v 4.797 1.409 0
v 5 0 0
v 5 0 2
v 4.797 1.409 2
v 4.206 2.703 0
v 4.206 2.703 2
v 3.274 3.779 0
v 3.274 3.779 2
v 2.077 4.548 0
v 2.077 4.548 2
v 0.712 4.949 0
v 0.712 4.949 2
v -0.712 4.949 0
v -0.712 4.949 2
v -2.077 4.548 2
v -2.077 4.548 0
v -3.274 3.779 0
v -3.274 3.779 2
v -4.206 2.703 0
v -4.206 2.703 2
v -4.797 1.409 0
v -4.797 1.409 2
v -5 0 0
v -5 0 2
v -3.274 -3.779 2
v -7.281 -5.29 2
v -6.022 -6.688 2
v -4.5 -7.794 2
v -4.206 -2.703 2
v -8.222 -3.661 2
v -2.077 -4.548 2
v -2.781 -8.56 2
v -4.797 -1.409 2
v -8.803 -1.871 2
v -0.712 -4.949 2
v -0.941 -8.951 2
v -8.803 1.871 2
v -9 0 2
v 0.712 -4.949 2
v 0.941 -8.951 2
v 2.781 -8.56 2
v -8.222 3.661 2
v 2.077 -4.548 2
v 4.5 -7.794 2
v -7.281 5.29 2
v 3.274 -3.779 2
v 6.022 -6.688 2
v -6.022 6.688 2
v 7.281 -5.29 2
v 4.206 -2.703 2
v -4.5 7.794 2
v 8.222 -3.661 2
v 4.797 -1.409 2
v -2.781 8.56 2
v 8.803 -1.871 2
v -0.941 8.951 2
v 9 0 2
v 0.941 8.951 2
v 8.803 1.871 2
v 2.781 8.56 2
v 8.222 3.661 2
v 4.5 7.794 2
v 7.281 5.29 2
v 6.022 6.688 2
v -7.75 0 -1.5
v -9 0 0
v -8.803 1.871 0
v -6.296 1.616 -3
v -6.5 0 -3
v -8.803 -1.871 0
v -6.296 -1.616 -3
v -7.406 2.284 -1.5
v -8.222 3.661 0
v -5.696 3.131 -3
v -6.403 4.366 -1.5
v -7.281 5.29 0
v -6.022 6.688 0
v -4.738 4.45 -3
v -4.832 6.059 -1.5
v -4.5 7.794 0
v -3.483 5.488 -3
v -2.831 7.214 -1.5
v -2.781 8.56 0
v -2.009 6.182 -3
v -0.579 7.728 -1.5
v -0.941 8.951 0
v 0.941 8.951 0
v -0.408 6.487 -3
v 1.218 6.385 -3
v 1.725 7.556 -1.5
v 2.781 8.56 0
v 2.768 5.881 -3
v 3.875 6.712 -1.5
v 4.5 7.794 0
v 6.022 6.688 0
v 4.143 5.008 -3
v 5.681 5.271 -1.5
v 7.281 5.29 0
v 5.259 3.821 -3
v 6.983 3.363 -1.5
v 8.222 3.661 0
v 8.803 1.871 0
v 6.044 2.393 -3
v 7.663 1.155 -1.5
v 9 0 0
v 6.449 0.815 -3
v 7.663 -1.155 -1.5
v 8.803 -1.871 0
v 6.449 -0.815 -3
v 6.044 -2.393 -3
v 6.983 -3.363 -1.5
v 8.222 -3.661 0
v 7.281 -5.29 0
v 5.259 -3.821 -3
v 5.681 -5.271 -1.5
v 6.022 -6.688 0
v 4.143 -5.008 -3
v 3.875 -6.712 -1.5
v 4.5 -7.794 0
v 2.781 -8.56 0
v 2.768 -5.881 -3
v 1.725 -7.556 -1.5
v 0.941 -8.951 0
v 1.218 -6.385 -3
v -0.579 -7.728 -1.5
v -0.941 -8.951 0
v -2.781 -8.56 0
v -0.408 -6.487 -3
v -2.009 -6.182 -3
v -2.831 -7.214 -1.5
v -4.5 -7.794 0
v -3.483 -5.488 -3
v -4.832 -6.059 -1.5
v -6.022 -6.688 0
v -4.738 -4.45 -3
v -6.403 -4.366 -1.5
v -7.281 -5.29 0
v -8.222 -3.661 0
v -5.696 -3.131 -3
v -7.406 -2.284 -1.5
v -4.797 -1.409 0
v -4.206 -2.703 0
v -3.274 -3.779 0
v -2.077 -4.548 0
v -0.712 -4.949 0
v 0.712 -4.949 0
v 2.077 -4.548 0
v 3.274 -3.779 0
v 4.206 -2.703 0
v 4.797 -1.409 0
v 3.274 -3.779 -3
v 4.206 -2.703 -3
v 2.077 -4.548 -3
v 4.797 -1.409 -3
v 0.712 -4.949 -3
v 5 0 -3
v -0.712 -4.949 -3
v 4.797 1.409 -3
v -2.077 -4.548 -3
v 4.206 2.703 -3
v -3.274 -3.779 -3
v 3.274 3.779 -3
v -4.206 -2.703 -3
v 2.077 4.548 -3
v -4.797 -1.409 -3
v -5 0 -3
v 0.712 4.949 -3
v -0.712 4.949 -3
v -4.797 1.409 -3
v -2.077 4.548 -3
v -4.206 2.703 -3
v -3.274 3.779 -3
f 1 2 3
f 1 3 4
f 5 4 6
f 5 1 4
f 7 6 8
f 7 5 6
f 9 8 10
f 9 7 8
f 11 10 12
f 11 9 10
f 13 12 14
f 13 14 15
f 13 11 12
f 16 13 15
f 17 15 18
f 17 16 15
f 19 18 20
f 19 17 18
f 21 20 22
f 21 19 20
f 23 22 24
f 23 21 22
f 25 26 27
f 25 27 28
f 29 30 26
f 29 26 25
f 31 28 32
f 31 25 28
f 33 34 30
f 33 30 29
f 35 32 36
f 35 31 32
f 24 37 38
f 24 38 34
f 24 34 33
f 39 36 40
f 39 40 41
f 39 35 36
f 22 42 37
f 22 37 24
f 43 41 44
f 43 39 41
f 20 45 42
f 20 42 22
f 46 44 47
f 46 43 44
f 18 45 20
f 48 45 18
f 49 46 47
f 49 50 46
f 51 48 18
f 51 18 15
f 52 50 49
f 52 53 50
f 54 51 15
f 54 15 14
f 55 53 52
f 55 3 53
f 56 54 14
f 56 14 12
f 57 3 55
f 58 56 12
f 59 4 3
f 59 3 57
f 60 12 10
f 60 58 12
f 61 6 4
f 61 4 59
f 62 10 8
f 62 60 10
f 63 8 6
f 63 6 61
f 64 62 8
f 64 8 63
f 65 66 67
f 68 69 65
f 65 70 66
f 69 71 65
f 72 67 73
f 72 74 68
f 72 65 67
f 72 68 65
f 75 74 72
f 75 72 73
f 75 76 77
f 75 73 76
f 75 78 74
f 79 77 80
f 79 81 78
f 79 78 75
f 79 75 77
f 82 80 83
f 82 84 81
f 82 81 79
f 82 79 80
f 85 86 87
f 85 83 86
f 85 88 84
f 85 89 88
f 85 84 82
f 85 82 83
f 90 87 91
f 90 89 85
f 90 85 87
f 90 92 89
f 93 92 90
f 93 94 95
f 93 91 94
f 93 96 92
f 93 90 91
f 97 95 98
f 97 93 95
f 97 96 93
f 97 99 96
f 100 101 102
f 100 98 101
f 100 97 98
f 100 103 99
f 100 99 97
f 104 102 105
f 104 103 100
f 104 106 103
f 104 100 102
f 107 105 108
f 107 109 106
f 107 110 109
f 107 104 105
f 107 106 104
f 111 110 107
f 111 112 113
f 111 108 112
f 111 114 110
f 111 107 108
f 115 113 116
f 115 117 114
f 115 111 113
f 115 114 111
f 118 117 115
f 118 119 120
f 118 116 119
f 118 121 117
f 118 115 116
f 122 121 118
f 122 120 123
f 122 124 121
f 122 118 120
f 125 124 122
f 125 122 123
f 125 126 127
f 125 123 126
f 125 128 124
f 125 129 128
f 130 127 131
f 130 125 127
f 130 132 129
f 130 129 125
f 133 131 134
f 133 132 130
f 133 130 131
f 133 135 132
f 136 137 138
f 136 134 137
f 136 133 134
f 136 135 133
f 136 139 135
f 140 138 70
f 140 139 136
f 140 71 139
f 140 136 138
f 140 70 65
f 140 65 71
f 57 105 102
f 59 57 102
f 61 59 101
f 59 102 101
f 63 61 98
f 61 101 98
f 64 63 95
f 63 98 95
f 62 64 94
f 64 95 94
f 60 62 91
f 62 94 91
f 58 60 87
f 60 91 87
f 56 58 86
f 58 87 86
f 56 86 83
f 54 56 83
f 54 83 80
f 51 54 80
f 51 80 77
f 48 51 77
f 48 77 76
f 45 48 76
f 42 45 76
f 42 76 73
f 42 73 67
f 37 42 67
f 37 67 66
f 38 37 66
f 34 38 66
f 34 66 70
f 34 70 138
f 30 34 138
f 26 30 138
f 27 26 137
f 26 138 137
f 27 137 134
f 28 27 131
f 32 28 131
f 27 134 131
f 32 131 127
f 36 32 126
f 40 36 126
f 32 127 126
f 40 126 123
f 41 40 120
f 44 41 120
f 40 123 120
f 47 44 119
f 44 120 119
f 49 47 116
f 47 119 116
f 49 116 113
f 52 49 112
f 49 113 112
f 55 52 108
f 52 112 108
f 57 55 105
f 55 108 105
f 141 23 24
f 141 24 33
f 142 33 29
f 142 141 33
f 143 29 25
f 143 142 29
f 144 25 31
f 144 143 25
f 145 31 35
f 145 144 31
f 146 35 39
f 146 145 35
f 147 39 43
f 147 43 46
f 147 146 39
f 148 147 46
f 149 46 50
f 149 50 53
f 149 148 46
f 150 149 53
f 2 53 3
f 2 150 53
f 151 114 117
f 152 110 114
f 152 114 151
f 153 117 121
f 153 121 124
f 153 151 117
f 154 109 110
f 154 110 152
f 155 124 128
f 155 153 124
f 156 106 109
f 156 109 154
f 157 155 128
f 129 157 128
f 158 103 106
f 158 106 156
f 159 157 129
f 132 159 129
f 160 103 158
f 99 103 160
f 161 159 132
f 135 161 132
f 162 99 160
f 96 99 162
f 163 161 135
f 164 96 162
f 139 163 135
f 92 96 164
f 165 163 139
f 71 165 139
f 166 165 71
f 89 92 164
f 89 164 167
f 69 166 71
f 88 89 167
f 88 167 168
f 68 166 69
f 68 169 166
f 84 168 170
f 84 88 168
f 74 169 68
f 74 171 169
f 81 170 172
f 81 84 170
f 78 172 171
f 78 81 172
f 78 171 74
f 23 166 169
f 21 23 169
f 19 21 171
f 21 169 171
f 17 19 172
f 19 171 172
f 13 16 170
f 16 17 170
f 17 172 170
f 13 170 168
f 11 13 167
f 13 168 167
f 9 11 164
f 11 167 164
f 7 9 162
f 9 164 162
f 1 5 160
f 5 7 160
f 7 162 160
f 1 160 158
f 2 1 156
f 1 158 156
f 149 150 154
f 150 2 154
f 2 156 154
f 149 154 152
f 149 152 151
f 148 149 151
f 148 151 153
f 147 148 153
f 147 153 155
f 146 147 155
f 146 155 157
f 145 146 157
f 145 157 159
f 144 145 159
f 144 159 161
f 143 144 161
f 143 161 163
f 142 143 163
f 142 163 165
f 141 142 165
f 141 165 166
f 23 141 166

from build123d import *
from build123d.topology import SkipClean

# Parameters (mm, degrees)
SKETCH1_R           = 9
SKETCH1_R_2         = 5
BOSS_EXTRUDE1_DEPTH = 2
SKETCH3_R           = 9
SKETCH2_R           = 6.5
SKETCH4_R           = 5
CUT_EXTRUDE1_DEPTH  = 5


with BuildPart() as part:
    # Sketch1 → Boss-Extrude1 (new body)
    with BuildSketch(Plane.XY):
        Circle(SKETCH1_R)
        Circle(SKETCH1_R_2, mode=Mode.SUBTRACT)
    extrude(amount=BOSS_EXTRUDE1_DEPTH)

    # Sketch3 → Loft1 section 0
    with BuildSketch(Plane(origin=(0, 0, 0), x_dir=(-1, 0, 0), z_dir=(0, 0, -1))):
        Circle(SKETCH3_R)
    # Sketch2 → Loft1 section 1
    with BuildSketch(Plane(origin=(0, 0, -3), x_dir=(-1, 0, 0), z_dir=(0, 0, -1))):
        Circle(SKETCH2_R)
    loft()

    # Sketch4 → Cut-Extrude1 (cut)
    with SkipClean():  # the faces are left unmerged after this step: merging them gives an invalid solid
        with BuildSketch(Plane(origin=(0, 0, -3), x_dir=(-1, 0, 0), z_dir=(0, 0, -1))):
            Circle(SKETCH4_R)
        extrude(amount=-CUT_EXTRUDE1_DEPTH, mode=Mode.SUBTRACT)


solid = part.part
